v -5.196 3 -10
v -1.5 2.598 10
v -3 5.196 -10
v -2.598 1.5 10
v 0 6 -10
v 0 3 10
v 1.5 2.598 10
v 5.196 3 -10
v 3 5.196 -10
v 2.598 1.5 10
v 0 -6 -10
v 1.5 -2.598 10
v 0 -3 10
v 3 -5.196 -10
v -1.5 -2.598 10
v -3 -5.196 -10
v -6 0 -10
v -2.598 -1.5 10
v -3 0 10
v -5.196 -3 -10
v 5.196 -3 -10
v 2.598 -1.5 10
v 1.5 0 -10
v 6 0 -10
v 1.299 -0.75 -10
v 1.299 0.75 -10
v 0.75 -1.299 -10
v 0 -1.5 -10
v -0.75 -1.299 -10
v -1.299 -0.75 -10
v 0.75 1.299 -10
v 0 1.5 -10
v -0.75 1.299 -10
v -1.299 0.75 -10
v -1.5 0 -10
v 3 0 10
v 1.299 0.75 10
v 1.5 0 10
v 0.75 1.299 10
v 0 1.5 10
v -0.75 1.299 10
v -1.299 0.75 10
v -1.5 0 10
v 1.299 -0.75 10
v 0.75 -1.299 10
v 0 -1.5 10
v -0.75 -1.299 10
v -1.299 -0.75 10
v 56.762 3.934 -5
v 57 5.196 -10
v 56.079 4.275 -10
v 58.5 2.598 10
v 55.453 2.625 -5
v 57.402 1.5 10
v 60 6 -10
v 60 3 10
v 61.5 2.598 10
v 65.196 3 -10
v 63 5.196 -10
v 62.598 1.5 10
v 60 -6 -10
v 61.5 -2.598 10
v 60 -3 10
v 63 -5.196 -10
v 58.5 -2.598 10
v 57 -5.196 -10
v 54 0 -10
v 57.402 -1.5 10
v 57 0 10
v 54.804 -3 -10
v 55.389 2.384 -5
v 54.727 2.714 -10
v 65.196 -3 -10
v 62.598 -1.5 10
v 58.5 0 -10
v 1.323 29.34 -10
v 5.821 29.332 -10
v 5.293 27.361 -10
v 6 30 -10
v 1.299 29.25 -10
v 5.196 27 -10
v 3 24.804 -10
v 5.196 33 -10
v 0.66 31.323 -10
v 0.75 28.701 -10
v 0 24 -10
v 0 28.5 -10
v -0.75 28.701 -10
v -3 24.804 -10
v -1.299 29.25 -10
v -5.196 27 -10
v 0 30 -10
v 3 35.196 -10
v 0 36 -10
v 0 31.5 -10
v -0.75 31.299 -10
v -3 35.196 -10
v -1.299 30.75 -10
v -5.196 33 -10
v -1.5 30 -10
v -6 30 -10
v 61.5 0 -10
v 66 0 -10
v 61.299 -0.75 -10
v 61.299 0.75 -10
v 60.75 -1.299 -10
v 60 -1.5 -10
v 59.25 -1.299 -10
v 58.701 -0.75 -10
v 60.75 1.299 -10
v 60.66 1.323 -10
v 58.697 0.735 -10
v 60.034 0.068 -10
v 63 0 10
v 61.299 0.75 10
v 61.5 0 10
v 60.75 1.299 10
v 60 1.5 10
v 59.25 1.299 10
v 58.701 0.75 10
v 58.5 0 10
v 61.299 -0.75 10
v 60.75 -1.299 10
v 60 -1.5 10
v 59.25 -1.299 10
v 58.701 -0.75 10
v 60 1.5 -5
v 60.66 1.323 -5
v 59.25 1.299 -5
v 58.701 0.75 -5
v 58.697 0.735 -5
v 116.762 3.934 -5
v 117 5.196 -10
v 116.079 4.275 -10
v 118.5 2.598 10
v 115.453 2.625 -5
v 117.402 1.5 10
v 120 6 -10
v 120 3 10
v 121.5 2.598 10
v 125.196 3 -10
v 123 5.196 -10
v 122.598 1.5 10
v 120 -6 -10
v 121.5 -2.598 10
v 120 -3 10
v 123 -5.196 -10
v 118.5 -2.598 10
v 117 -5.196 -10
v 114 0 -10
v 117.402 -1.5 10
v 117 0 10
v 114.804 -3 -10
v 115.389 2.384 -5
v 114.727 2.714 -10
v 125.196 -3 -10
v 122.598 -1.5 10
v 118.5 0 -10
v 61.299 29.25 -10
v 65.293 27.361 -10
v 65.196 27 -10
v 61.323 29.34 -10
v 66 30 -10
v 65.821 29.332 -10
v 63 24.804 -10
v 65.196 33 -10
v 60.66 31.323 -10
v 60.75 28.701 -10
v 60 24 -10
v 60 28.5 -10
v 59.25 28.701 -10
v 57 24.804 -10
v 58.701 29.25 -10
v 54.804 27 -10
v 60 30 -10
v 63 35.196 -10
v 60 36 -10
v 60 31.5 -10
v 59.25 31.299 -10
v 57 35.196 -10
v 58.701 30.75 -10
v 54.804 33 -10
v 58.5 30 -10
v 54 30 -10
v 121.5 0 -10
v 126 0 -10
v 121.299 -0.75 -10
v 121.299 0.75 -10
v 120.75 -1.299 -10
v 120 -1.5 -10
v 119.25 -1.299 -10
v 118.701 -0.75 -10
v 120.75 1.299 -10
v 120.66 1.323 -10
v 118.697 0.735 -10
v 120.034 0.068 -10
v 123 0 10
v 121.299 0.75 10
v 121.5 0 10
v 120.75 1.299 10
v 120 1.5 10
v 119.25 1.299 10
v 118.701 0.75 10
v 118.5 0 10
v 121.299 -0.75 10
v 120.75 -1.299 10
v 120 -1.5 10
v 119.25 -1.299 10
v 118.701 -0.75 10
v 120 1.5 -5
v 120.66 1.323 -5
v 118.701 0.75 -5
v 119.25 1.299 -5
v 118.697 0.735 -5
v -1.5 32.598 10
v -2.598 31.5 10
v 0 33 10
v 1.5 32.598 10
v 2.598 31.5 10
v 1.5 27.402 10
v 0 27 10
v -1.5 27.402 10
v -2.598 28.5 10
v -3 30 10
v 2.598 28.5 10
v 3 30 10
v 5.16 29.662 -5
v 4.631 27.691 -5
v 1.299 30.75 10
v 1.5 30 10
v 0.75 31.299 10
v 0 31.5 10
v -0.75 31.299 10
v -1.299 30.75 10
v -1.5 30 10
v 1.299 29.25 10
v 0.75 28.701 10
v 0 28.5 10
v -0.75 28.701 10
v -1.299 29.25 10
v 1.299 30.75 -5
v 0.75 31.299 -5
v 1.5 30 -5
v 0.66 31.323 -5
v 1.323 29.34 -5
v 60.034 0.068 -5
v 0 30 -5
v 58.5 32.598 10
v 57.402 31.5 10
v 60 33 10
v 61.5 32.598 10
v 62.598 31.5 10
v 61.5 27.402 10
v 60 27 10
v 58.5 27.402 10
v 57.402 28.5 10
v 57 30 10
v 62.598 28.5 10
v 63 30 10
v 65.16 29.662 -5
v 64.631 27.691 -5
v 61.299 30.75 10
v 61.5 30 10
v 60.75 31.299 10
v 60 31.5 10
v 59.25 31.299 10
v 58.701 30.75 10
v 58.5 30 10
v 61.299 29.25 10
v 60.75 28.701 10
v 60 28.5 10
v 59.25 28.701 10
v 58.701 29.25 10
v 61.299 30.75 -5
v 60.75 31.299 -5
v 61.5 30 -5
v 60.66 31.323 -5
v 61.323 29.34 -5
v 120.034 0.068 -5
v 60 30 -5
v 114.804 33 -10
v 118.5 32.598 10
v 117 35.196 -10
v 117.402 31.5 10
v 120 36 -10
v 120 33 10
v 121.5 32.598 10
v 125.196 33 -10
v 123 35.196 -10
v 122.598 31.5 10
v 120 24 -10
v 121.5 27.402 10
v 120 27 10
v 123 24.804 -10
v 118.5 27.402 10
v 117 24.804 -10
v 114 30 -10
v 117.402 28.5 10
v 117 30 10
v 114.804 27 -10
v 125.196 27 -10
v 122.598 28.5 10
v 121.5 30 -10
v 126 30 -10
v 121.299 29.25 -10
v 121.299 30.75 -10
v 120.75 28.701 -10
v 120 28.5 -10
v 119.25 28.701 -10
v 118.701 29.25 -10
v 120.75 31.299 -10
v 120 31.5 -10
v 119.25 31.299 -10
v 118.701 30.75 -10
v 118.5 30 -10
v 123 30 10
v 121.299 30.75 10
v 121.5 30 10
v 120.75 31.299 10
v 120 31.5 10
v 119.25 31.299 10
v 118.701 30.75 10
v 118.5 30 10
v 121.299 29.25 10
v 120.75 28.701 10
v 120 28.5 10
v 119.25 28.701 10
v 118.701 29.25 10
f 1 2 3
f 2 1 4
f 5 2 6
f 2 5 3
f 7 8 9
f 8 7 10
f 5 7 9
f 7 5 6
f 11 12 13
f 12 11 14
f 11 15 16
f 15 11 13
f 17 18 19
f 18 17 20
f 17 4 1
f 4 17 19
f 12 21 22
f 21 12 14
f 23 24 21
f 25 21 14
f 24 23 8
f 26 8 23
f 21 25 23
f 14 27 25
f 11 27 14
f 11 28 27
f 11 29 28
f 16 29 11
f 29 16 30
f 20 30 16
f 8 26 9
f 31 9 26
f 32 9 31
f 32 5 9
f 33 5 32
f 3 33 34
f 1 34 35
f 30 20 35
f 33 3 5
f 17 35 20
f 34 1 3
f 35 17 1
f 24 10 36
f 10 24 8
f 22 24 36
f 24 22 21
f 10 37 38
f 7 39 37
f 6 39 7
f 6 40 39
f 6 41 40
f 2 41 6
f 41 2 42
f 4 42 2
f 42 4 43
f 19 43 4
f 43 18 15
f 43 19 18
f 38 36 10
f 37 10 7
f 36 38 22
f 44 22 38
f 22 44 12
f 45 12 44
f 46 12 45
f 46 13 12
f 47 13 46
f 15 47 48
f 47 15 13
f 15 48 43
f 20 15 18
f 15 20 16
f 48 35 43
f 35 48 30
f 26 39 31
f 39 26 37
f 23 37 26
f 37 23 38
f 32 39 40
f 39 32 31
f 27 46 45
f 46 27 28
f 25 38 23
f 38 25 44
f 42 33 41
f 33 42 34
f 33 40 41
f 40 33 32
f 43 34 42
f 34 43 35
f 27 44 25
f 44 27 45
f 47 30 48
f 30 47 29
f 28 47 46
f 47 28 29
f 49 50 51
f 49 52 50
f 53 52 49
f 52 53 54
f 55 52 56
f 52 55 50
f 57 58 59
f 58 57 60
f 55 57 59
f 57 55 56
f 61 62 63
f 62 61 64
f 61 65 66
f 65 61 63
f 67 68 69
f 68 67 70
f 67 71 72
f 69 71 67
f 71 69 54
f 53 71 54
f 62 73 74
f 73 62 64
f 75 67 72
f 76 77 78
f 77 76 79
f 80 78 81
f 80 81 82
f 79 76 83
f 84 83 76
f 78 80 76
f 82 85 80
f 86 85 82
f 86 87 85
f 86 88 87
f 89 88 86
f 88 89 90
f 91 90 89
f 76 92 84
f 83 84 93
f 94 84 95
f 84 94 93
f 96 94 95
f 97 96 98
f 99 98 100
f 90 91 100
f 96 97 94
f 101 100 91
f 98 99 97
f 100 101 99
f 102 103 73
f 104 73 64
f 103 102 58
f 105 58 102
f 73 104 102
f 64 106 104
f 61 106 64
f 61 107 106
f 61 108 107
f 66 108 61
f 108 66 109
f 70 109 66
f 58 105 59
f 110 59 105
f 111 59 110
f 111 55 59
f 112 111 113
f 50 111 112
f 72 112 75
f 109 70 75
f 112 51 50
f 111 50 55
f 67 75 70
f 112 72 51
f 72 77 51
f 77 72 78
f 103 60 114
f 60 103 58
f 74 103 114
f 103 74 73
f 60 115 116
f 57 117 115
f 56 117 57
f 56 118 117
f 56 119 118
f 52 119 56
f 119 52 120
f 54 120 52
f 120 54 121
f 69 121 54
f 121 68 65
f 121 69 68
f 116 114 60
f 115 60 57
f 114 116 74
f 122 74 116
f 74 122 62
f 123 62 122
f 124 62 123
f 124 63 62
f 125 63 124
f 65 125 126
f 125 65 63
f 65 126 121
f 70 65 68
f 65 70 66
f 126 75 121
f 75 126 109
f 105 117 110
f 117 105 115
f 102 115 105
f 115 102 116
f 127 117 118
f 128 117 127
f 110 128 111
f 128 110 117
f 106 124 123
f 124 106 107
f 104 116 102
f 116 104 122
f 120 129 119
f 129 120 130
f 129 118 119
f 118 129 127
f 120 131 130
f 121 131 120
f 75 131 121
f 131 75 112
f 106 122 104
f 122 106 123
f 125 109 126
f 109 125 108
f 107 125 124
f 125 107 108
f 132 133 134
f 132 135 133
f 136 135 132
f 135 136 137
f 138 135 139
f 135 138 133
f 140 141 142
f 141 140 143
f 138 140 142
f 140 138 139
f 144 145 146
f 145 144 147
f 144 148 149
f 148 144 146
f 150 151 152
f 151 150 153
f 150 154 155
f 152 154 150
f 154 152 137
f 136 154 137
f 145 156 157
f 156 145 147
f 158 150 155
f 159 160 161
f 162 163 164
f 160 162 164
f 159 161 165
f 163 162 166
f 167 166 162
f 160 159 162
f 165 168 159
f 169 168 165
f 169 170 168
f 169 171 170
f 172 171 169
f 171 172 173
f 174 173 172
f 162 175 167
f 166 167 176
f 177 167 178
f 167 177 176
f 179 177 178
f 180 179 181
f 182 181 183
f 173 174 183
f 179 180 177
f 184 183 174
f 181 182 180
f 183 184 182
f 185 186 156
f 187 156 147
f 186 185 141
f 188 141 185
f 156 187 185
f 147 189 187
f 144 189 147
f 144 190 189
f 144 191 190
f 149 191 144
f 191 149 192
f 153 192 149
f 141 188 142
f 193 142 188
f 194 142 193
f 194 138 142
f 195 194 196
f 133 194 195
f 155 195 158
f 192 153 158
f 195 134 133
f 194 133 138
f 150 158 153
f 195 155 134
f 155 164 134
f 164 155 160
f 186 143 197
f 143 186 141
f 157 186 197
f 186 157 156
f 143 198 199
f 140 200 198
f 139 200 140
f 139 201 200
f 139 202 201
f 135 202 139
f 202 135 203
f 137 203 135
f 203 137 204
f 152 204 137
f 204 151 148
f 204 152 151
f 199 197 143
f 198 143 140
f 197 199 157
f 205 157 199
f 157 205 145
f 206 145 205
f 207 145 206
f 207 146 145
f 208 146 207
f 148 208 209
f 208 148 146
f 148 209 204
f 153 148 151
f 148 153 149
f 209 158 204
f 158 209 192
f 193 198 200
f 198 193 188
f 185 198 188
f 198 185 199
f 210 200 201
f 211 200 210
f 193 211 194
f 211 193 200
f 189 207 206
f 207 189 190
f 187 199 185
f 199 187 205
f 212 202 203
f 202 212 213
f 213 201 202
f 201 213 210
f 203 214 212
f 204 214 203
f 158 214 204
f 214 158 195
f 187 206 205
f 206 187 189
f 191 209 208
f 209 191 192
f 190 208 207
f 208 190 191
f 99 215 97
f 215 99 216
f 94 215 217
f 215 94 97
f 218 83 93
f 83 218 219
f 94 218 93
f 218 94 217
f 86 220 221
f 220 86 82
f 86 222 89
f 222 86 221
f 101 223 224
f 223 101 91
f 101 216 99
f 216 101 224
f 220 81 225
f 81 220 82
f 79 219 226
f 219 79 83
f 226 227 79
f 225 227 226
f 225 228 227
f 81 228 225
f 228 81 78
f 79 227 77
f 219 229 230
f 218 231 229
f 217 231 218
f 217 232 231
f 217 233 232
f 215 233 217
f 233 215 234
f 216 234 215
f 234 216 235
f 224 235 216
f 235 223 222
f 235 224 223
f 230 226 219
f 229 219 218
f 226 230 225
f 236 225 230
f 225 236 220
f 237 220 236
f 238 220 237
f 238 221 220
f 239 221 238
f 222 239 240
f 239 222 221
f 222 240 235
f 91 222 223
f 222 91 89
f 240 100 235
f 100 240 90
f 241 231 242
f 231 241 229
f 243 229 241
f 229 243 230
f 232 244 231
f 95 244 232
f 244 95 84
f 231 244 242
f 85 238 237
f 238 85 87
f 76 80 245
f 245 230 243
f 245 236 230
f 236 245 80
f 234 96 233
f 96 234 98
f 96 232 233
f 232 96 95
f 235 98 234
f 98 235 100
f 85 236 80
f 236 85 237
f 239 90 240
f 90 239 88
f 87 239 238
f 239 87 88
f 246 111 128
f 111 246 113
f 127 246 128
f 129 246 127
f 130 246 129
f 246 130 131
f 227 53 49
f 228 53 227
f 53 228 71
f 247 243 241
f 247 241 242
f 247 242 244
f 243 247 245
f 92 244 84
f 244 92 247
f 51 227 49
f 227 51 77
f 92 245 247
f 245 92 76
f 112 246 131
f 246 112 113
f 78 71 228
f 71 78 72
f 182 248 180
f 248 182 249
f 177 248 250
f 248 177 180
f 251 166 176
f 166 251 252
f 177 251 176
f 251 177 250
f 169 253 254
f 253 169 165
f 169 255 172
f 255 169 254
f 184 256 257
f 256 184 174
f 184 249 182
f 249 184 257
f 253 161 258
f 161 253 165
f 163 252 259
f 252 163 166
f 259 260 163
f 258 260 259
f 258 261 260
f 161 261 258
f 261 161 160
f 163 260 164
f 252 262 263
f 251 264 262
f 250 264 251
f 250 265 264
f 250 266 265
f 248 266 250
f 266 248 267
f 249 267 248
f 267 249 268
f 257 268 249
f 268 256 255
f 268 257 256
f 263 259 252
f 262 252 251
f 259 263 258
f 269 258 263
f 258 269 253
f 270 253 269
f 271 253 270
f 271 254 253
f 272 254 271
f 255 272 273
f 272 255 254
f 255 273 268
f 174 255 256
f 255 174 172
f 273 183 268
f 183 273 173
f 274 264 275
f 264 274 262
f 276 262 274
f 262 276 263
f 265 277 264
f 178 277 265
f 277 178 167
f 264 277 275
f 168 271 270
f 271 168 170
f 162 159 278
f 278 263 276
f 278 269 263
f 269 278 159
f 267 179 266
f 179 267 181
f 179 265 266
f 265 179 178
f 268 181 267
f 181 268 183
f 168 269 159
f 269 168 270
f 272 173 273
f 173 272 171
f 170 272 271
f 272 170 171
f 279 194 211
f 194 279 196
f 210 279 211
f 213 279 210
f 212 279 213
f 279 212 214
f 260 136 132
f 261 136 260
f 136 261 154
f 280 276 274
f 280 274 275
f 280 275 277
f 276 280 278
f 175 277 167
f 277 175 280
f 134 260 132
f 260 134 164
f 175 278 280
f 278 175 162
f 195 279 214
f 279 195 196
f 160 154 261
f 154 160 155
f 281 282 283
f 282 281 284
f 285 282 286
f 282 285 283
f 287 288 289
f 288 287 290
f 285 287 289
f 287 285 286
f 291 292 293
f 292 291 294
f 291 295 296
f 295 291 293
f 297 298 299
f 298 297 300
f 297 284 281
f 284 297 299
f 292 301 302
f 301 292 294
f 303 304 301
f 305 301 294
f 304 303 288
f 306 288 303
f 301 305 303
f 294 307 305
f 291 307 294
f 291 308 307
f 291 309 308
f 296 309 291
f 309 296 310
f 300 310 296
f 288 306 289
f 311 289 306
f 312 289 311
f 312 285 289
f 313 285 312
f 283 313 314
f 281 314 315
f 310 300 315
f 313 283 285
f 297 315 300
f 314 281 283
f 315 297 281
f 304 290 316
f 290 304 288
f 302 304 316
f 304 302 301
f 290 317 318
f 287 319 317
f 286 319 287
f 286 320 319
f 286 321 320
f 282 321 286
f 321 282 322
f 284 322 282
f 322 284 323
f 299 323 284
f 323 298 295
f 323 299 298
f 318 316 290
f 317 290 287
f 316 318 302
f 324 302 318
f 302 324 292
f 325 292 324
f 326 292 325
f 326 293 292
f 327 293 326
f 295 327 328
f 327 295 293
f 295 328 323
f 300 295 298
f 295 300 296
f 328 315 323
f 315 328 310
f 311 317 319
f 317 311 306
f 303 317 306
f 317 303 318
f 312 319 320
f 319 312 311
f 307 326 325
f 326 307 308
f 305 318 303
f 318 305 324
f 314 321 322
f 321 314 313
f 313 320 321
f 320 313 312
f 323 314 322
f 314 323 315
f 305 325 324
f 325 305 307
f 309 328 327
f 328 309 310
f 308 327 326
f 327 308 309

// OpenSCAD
boss_i_radius = 1.5;
boss_e_radius = 3;
h_space = 60;
v_space = 30;
boss_height = 20;

boss_rows = 2;
boss_columns = 3;

union(){
  for(v = [0:1:boss_rows-1]) {
    v_offset = v_space*v;
    for(h = [0:1:boss_columns-1]) {
        translate([h_space*h,v_offset,0]) {
          if(h!=boss_columns-1){
            translate([0,0,-boss_height/2]) {
              if(v%2 == 1) {
                l = sqrt(h_space*h_space+v_space*v_space);
                echo(cos(l));
                rotate(-26.5){
                  cube([l,2,5], center=false);
                }
              } else {
//                rotate(45){
//                 cube([sqrt(h_space*h_space+v_space*v_space),2,5], center=false);
//                }
               }
             }
           }
            difference() {
                cylinder($fn=12,h=boss_height, r1=boss_e_radius+3, r2=boss_e_radius, center=true);
                cylinder($fn=12, h=boss_height, r1=boss_i_radius, r2=boss_i_radius, center=true);
            }
        }
    }
  }
}
